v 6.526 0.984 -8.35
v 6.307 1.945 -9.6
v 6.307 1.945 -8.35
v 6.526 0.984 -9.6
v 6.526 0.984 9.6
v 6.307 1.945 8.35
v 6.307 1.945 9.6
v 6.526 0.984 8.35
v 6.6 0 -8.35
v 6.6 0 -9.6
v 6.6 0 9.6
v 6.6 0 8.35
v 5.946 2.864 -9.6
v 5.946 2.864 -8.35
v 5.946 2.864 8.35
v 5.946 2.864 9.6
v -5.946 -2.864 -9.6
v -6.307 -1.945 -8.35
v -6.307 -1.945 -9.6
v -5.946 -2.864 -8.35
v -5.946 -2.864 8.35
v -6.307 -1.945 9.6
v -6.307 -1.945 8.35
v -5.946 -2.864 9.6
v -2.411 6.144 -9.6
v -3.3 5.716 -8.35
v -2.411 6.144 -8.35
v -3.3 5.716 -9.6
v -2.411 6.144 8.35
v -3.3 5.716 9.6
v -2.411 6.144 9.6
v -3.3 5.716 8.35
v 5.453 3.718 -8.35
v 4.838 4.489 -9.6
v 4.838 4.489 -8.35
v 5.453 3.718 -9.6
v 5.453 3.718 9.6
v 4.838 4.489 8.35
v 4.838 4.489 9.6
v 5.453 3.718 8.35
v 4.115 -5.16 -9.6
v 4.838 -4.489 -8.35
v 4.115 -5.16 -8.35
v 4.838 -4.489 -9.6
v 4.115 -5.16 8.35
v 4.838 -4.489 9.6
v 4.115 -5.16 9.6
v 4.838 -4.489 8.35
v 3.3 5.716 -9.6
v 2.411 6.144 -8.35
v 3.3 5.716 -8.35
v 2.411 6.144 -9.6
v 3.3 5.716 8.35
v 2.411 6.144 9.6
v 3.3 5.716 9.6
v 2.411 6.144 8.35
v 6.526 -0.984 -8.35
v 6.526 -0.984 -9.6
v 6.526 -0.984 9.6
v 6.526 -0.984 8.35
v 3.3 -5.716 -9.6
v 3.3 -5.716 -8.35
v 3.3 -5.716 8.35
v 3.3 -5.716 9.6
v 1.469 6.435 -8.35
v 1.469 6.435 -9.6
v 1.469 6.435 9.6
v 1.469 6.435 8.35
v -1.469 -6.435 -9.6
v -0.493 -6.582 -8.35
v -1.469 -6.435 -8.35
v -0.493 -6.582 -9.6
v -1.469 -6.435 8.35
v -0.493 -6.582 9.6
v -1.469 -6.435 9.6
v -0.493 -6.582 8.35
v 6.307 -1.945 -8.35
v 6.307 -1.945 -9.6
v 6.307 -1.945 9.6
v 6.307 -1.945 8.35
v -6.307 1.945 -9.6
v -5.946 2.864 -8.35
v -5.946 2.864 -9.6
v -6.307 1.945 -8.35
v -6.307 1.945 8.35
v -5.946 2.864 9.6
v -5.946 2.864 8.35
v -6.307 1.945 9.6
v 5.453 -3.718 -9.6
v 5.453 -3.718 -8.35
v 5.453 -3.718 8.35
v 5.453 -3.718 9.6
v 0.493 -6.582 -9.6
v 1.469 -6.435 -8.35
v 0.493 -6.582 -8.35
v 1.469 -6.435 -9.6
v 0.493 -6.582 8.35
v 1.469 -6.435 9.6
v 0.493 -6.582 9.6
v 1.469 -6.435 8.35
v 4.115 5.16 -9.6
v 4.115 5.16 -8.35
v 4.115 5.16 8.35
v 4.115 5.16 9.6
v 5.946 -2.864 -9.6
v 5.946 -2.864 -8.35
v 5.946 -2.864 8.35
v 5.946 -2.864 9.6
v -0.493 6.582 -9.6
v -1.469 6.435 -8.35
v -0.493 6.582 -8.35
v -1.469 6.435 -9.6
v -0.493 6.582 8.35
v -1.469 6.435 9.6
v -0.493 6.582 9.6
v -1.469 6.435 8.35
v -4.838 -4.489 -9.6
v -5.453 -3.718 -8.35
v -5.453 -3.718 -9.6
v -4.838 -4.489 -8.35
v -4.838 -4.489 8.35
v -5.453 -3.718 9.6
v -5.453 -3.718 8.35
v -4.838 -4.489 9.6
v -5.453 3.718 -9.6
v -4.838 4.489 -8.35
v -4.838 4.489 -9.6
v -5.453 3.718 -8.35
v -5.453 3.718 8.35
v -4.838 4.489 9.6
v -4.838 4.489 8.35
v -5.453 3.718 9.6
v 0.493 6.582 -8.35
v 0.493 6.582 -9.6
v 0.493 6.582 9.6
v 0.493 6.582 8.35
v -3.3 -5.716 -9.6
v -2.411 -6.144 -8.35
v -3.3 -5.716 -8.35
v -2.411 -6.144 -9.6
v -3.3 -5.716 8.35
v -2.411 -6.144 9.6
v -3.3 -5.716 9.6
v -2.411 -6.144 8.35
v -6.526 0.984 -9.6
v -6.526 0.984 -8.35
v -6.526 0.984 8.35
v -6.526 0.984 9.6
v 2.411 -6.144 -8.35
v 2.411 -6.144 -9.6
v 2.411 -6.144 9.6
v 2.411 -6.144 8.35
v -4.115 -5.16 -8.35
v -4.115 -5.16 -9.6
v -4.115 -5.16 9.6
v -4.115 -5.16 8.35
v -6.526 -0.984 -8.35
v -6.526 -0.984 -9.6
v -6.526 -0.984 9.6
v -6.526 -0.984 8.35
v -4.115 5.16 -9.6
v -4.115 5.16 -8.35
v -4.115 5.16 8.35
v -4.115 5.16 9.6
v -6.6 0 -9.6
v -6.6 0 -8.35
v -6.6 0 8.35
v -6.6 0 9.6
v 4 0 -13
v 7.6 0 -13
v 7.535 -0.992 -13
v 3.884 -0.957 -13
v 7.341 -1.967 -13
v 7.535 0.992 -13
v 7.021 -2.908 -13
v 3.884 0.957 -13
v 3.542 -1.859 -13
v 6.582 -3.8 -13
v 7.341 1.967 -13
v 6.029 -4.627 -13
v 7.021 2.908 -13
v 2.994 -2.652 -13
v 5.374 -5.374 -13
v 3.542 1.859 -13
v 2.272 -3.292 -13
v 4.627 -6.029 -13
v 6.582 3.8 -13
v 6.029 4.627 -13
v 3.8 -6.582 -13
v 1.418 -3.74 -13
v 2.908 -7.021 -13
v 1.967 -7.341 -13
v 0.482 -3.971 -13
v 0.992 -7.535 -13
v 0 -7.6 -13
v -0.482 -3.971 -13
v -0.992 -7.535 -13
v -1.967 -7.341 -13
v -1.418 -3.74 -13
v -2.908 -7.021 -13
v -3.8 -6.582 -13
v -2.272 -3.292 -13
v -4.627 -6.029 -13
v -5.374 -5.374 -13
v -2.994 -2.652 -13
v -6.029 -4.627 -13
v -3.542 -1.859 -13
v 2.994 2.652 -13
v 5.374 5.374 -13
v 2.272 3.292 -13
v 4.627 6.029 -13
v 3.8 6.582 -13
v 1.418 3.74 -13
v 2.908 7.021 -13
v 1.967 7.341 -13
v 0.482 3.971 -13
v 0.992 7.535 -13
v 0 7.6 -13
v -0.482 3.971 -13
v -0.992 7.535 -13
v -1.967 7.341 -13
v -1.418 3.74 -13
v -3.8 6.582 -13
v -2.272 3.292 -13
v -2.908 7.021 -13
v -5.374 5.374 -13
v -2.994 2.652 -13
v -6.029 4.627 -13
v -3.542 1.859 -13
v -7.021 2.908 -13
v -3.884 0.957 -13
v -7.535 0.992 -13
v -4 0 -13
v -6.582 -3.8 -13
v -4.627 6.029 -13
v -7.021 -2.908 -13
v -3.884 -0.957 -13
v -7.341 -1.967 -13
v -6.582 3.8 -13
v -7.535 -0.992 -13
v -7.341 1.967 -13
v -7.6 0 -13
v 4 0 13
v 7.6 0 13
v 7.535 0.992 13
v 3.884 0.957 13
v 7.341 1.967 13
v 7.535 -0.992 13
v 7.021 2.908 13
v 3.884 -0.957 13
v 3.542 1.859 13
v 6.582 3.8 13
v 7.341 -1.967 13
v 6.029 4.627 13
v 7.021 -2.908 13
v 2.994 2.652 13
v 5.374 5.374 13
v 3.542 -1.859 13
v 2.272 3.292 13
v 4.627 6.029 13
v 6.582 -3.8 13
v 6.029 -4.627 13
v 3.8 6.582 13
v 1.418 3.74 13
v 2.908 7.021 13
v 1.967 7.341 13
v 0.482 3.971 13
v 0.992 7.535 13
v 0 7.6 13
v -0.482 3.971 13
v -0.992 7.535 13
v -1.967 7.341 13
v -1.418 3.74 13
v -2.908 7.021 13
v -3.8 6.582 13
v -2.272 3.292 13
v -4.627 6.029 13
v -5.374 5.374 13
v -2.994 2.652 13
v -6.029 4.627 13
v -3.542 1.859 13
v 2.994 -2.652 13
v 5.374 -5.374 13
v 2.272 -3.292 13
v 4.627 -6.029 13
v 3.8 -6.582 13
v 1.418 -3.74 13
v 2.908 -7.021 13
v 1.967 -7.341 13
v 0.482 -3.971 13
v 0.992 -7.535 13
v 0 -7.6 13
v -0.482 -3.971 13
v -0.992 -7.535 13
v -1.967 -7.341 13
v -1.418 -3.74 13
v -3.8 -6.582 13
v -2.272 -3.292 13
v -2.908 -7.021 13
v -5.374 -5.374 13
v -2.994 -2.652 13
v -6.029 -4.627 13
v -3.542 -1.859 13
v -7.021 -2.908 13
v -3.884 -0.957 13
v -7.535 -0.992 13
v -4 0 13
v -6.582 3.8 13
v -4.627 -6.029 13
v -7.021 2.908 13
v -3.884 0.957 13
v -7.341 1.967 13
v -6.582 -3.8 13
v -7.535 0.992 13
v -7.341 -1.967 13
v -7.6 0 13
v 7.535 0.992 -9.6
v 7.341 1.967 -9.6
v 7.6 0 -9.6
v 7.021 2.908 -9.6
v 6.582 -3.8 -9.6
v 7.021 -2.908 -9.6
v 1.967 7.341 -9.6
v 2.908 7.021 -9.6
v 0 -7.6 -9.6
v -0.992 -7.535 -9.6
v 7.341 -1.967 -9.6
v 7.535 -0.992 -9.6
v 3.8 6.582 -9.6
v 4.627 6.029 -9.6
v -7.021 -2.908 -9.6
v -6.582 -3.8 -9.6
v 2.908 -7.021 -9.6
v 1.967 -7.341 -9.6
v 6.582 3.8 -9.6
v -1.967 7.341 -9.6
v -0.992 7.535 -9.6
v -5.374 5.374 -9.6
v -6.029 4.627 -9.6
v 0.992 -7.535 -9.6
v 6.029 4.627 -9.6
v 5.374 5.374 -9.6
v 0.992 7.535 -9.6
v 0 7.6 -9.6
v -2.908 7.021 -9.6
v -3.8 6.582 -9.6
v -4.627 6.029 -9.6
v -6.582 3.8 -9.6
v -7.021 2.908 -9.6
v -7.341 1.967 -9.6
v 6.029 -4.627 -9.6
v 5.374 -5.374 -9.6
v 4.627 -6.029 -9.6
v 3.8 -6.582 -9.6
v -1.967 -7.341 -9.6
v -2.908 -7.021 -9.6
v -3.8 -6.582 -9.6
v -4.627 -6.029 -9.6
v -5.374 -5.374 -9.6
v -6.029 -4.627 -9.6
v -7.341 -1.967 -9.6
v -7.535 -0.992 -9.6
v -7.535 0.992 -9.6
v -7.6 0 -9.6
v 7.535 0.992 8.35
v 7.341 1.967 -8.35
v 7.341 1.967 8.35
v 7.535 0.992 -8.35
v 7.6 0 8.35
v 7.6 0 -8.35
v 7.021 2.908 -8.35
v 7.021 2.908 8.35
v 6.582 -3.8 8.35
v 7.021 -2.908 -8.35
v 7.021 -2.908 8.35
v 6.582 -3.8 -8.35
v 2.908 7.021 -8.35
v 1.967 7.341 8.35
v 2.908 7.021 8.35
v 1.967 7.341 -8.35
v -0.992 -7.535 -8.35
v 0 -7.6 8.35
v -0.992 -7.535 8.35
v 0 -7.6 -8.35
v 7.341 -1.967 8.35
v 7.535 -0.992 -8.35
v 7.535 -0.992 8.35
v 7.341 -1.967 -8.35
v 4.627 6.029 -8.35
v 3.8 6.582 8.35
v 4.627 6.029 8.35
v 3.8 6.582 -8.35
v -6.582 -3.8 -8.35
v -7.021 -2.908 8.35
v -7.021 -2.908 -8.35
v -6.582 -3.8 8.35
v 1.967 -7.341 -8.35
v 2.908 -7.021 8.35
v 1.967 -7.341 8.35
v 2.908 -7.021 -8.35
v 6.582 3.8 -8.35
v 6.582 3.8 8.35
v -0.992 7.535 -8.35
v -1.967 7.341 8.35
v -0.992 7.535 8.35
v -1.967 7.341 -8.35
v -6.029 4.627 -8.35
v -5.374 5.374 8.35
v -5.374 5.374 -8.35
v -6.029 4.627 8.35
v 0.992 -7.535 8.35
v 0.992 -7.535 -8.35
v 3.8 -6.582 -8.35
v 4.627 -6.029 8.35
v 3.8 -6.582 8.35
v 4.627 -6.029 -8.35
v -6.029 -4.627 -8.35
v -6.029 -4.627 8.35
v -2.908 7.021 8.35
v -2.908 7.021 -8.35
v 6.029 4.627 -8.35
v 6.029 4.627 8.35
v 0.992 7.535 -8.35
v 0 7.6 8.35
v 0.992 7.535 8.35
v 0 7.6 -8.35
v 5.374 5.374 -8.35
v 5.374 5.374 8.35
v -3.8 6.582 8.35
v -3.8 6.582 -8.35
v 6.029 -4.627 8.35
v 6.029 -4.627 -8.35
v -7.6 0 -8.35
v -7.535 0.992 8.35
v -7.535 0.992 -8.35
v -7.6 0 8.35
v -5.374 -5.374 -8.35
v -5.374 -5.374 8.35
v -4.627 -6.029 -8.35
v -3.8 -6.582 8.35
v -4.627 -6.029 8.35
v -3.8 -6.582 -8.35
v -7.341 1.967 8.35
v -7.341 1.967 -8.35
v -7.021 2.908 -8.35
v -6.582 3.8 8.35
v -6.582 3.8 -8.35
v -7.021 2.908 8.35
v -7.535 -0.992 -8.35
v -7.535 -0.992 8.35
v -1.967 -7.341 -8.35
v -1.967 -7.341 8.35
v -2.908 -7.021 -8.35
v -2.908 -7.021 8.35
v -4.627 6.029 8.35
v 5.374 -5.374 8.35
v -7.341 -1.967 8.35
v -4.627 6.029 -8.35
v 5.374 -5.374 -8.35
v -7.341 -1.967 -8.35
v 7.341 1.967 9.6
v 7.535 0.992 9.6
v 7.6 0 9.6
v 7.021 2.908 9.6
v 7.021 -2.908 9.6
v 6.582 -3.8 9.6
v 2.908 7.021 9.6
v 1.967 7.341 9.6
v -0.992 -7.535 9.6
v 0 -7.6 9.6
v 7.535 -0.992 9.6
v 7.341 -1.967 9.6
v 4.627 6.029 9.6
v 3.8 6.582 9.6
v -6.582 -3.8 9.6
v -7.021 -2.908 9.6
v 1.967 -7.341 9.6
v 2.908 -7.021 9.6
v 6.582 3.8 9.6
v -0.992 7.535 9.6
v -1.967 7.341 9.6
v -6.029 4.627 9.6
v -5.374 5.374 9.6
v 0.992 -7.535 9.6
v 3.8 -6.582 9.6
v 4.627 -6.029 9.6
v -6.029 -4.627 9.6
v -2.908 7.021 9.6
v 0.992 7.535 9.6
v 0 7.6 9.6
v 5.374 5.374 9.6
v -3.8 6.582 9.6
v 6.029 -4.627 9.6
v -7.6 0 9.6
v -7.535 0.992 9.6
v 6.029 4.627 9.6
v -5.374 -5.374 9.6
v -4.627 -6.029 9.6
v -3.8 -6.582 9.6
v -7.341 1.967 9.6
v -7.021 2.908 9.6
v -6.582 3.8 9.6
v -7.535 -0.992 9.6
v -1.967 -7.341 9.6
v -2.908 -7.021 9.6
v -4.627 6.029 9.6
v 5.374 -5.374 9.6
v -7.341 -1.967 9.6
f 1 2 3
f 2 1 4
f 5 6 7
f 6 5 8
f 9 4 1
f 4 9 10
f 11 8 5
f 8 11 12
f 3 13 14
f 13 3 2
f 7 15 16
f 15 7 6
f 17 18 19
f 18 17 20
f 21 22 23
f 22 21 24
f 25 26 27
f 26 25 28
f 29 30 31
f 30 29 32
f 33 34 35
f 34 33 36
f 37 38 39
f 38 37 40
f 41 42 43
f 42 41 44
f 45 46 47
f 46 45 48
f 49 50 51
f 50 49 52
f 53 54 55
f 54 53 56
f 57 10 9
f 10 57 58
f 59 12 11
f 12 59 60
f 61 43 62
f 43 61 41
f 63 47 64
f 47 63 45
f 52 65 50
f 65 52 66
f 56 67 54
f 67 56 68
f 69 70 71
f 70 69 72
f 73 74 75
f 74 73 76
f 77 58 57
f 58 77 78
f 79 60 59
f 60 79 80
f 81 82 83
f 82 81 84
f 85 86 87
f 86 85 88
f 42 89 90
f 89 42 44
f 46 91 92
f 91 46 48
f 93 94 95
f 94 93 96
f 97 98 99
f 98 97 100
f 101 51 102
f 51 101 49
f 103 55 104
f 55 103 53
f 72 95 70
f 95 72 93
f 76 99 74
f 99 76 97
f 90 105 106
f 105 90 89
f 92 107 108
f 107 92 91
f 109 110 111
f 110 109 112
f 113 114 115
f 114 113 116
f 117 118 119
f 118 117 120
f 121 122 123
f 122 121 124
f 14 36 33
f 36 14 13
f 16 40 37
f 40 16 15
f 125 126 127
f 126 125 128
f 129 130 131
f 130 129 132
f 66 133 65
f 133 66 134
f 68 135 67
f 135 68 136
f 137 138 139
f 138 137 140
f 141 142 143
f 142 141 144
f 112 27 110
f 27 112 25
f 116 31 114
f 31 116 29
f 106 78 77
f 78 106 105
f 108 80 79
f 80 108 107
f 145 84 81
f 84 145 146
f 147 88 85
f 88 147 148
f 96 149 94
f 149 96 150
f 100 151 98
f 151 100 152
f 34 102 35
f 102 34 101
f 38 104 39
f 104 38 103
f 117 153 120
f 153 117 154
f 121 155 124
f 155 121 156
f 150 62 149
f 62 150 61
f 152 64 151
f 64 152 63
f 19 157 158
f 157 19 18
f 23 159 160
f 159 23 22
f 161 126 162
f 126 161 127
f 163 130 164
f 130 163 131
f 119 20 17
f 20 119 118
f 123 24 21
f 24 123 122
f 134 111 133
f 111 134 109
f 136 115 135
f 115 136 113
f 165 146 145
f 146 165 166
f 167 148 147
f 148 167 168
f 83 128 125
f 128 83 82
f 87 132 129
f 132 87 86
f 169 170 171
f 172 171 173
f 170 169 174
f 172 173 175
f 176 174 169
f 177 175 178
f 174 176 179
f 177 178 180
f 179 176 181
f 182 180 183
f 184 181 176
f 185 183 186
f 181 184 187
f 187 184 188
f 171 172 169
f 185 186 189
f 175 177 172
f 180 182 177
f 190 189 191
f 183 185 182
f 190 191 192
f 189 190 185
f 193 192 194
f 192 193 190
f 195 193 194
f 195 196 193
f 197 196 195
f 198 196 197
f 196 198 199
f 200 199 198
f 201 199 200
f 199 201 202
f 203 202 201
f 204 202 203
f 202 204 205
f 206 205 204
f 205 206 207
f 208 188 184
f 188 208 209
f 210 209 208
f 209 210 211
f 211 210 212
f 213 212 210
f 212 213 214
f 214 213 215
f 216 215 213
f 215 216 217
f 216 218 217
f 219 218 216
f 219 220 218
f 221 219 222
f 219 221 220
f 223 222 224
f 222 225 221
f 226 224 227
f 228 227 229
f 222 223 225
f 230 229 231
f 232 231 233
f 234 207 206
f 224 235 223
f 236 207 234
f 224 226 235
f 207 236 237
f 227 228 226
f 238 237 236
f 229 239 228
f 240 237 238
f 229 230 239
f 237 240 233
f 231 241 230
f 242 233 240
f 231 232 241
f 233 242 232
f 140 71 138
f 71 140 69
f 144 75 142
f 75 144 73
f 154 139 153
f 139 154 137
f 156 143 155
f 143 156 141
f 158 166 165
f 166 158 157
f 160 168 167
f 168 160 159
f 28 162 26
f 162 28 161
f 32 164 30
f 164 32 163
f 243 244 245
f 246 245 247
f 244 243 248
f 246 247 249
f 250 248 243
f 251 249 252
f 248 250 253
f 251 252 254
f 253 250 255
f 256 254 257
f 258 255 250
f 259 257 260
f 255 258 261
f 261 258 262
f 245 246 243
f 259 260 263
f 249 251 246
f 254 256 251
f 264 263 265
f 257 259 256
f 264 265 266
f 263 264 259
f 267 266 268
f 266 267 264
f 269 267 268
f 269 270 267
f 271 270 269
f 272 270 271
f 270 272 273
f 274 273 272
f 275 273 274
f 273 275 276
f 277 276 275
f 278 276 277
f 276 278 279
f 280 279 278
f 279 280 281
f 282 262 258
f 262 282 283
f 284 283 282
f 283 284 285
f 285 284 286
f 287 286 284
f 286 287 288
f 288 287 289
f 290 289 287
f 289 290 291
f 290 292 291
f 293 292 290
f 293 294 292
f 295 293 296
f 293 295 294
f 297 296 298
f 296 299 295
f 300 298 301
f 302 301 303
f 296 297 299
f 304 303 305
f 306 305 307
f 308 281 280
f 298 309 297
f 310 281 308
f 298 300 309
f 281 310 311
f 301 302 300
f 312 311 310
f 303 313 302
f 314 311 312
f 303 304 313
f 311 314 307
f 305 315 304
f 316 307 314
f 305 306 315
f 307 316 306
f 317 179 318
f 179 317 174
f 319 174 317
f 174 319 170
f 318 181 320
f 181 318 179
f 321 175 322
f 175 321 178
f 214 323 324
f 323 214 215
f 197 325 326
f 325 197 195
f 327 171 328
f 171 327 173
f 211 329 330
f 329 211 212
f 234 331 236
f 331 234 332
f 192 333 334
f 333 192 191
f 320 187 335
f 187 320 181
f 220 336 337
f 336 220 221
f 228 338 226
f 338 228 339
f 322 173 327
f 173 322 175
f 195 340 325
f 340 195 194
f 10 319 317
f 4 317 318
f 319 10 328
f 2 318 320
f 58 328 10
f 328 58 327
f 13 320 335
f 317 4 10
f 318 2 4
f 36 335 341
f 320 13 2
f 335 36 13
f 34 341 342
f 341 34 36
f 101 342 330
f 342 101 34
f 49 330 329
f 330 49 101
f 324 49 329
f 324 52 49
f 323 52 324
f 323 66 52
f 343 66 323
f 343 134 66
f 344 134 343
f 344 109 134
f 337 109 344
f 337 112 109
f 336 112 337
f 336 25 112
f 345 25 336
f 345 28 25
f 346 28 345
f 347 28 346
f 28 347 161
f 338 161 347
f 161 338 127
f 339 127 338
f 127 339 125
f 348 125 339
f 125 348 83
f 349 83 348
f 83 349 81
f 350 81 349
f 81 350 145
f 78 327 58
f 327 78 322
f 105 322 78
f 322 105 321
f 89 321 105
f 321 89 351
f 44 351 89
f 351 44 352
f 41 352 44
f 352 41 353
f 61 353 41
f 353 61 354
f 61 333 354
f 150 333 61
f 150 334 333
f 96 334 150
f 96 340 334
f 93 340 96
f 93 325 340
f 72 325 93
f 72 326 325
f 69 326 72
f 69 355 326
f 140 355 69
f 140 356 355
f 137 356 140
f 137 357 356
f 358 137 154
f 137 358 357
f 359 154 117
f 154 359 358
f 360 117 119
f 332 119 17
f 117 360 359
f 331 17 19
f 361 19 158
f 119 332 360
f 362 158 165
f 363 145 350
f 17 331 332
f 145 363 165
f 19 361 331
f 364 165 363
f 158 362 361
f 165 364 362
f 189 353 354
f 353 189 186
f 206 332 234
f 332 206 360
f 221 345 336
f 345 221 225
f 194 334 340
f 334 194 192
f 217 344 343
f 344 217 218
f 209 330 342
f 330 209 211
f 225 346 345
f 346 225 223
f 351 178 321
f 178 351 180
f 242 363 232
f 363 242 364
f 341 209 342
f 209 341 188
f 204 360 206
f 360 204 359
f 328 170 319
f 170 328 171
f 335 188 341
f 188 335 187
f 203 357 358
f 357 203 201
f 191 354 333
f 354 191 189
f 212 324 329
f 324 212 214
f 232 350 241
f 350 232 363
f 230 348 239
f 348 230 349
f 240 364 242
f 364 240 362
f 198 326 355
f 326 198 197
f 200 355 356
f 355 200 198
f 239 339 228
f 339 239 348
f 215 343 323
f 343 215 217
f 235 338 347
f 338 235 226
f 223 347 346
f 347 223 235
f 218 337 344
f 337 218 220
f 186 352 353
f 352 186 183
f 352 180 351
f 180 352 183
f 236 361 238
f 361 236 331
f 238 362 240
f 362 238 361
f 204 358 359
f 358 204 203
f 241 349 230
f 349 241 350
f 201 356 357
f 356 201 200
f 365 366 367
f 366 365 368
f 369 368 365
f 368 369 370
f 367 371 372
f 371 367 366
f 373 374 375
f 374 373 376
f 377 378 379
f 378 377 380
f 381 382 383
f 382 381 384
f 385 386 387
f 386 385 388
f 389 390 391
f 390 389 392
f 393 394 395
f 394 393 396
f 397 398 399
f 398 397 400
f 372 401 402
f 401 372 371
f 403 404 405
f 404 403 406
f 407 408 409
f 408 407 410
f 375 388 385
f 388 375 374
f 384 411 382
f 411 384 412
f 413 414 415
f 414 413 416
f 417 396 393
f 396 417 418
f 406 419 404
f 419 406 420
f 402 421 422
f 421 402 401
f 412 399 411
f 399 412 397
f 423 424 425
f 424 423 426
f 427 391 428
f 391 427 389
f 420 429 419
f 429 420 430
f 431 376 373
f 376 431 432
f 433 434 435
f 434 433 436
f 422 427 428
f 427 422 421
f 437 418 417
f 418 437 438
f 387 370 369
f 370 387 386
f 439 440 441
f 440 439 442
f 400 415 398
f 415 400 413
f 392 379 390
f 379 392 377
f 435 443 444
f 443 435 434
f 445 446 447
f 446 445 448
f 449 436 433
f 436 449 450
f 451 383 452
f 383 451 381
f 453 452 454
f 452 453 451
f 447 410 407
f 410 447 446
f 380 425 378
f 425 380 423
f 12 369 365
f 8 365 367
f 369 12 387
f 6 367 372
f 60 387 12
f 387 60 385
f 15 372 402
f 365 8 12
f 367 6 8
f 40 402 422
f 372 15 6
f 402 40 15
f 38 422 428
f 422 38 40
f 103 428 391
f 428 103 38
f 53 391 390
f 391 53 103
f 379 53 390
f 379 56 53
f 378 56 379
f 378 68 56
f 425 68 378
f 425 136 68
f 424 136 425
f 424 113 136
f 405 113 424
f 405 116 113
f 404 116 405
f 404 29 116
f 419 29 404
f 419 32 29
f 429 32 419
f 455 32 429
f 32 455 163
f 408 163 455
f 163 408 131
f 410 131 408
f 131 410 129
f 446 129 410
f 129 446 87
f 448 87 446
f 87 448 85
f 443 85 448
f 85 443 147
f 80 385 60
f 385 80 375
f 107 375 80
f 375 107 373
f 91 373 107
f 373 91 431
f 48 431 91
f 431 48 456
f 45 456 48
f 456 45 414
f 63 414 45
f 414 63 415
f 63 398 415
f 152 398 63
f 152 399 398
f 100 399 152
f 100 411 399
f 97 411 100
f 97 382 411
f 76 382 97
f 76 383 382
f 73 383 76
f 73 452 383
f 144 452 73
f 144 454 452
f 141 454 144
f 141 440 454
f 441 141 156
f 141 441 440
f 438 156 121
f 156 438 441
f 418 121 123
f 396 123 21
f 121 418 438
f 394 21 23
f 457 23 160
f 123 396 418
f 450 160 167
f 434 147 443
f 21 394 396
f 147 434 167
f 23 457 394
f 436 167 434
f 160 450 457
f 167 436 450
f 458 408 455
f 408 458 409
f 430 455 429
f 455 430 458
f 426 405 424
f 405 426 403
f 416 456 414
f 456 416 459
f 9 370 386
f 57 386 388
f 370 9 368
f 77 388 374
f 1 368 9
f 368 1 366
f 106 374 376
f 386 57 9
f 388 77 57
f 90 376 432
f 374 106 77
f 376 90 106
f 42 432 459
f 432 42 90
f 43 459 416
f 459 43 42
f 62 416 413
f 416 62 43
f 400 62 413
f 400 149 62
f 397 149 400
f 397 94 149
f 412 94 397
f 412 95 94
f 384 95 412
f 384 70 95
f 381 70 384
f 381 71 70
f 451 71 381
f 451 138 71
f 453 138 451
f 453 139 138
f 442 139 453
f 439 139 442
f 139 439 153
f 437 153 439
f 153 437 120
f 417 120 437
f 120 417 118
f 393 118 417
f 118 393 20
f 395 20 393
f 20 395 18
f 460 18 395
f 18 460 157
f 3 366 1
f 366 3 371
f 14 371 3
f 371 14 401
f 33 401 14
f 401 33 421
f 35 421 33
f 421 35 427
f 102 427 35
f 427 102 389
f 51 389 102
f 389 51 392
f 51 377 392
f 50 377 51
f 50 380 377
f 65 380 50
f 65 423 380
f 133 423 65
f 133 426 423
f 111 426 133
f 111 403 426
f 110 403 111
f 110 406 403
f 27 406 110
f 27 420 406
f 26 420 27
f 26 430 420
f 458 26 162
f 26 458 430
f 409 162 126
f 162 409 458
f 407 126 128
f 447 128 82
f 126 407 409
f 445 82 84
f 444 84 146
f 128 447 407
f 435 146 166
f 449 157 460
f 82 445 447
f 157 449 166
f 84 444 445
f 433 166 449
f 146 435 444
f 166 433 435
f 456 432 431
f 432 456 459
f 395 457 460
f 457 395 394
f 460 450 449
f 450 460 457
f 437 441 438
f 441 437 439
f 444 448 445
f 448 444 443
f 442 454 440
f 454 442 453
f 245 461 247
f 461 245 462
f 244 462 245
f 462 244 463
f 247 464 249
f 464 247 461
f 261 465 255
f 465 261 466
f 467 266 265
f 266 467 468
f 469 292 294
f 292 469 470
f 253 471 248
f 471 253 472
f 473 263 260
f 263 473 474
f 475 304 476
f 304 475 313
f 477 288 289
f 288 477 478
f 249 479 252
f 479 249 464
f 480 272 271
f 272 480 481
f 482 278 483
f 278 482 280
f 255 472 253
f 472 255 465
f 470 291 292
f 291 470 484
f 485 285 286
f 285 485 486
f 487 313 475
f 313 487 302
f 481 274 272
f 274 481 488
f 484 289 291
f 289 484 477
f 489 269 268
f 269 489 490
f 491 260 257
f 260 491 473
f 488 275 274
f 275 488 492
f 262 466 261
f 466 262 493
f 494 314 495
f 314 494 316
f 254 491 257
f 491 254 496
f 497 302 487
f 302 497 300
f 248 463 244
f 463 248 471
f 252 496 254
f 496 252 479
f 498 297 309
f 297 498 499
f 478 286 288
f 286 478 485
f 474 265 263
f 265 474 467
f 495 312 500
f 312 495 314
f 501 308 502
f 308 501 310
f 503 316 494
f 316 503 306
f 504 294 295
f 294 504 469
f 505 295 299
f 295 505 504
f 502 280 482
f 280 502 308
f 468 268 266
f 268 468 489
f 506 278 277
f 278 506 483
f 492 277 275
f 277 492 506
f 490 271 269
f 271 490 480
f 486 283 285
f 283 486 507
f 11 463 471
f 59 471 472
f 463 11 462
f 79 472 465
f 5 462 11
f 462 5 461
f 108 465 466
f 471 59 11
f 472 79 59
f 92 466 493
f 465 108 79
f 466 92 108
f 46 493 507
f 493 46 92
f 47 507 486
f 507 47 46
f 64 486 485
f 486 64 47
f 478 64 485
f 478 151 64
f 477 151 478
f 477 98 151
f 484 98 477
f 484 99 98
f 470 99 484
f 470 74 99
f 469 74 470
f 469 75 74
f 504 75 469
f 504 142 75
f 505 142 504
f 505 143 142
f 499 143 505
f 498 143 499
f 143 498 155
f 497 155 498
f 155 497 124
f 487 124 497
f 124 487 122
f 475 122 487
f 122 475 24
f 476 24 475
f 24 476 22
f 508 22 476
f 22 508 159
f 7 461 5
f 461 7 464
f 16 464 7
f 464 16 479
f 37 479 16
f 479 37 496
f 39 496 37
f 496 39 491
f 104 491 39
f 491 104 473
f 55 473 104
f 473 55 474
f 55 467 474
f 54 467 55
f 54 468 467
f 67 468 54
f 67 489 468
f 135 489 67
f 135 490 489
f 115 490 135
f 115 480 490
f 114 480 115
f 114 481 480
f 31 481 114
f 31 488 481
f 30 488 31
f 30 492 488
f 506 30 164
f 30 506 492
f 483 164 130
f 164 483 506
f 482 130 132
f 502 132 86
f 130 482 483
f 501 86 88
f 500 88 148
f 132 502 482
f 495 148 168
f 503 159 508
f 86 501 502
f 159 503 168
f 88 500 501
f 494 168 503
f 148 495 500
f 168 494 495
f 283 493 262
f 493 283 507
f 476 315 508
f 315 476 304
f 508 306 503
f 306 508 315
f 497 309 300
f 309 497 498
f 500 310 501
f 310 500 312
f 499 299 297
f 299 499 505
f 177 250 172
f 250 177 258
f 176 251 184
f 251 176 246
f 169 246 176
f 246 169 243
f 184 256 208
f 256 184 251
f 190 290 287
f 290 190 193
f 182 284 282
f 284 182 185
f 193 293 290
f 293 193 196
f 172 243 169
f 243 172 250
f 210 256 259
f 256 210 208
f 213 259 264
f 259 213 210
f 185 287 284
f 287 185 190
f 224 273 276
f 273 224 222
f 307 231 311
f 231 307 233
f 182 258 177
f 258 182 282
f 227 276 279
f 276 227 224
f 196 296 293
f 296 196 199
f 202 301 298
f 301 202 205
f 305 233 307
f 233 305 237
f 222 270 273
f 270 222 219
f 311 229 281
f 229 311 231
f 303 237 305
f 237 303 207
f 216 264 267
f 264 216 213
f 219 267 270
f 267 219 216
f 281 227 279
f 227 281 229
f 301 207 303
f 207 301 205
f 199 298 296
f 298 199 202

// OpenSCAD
// file: ../config.scad
/*
 * config
 *
 * Copyright 2013 <b@Zi.iS>
 * License CC BY 3.0
 */

$fa = 1;
$fs = 1;
preview = 1;

// preview colors
color_steal = [.8,.8,.8];
color_wood = [.3,.3,0];
color_print = [0,.8,0];

// metric bolt sizes
function m_hole(size) = size*1.1/2;
function m_pilot(size) = size*.9/2;

mounting_bolt = 3;

// slightly move and slightly elongate objects in preview to overcome scad rounding errors
module e() {
	if(preview==1) {
		translate([
			0,
			0,
			-.1
		]) {
			scale([
				1,
				1,
				1.1
			]) {
				child();
			}
		}
	} else {
		child();
	}
}

module m_washer(
	size = 3
) {
	color(color_steal) {
		difference() {
			cylinder(
				r = size/2*2,
				h = size*.2
			);
			e() cylinder(
				r = size/2,
				h = size*.2
			);
		}
	}
	translate([
		0,
		0,
		size*.2
	]) {
		child();
	}
}

module m_nut(
	size = 3
) {
	color(color_steal) {
		difference() {
			cylinder(
				r = size*1.8/2,
				h = size*.8,
				$fn = 6
			);
		}
	}
	translate([
		0,
		0,
		size*.8
	]) {
		child();
	}
}

module m_nylock(
	size = 3
) {
	color(color_steal) {
		difference() {
			cylinder(
				r = size*1.8/2,
				h = size,
				$fn = 6
			);
		}
	}
	translate([
		0,
		0,
		size
	]) {
		child();
	}
}

module screw(
	r = 1,
	h = 1,
	pitch = 5,
) {
	linear_extrude(
		height = h,
		twist = -h/pitch*360
	) {
		translate([pitch/5,0,0]) { //H=.2*p works better in plastic then ISO's H=.866*p
			circle(
				r=r 
			);
		}
	}
}

fan40 = [
	40,			//width/length
	10,			//height
	32,			//bolt pitch
	3,			//bolt
];

lm8uu = [
	15.2/2,	//outside
	8/2,	//inside
	26,		//length
];
// main file
/*
 * linear bearing
 *
 * Copyright 2013 <b@Zi.iS>
 * License CC BY 3.0
 */

include <../config.scad>;

linear_bearing();

module linear_bearing(
	size = lm8uu,
) {
	echo("Linear bearing ", size[1] * 2, "mm");
	color(color_steal) {
		translate([
			0,
			0,
			-size[2]/2
		]) {
			difference() {
				union() {
					cylinder(
						r = size[0] - 1,
						h = size[2]
					);
					cylinder(
						r = size[0],
						h = 3.4
					);
					translate([
						0,
						0,
						3.4 + 1.25
					]) {
						cylinder(
							r = size[0],
							h = size[2] - (3.4 + 1.25) * 2
						);
					}
					translate([
						0,
						0,
						size[2] - 3.4
					]) {
						cylinder(
							r = size[0],
							h = 3.4
						);
					}
				}
				e() cylinder(
					r = size[1],
					h = size[2]
				);
			}
		}
	}
}
